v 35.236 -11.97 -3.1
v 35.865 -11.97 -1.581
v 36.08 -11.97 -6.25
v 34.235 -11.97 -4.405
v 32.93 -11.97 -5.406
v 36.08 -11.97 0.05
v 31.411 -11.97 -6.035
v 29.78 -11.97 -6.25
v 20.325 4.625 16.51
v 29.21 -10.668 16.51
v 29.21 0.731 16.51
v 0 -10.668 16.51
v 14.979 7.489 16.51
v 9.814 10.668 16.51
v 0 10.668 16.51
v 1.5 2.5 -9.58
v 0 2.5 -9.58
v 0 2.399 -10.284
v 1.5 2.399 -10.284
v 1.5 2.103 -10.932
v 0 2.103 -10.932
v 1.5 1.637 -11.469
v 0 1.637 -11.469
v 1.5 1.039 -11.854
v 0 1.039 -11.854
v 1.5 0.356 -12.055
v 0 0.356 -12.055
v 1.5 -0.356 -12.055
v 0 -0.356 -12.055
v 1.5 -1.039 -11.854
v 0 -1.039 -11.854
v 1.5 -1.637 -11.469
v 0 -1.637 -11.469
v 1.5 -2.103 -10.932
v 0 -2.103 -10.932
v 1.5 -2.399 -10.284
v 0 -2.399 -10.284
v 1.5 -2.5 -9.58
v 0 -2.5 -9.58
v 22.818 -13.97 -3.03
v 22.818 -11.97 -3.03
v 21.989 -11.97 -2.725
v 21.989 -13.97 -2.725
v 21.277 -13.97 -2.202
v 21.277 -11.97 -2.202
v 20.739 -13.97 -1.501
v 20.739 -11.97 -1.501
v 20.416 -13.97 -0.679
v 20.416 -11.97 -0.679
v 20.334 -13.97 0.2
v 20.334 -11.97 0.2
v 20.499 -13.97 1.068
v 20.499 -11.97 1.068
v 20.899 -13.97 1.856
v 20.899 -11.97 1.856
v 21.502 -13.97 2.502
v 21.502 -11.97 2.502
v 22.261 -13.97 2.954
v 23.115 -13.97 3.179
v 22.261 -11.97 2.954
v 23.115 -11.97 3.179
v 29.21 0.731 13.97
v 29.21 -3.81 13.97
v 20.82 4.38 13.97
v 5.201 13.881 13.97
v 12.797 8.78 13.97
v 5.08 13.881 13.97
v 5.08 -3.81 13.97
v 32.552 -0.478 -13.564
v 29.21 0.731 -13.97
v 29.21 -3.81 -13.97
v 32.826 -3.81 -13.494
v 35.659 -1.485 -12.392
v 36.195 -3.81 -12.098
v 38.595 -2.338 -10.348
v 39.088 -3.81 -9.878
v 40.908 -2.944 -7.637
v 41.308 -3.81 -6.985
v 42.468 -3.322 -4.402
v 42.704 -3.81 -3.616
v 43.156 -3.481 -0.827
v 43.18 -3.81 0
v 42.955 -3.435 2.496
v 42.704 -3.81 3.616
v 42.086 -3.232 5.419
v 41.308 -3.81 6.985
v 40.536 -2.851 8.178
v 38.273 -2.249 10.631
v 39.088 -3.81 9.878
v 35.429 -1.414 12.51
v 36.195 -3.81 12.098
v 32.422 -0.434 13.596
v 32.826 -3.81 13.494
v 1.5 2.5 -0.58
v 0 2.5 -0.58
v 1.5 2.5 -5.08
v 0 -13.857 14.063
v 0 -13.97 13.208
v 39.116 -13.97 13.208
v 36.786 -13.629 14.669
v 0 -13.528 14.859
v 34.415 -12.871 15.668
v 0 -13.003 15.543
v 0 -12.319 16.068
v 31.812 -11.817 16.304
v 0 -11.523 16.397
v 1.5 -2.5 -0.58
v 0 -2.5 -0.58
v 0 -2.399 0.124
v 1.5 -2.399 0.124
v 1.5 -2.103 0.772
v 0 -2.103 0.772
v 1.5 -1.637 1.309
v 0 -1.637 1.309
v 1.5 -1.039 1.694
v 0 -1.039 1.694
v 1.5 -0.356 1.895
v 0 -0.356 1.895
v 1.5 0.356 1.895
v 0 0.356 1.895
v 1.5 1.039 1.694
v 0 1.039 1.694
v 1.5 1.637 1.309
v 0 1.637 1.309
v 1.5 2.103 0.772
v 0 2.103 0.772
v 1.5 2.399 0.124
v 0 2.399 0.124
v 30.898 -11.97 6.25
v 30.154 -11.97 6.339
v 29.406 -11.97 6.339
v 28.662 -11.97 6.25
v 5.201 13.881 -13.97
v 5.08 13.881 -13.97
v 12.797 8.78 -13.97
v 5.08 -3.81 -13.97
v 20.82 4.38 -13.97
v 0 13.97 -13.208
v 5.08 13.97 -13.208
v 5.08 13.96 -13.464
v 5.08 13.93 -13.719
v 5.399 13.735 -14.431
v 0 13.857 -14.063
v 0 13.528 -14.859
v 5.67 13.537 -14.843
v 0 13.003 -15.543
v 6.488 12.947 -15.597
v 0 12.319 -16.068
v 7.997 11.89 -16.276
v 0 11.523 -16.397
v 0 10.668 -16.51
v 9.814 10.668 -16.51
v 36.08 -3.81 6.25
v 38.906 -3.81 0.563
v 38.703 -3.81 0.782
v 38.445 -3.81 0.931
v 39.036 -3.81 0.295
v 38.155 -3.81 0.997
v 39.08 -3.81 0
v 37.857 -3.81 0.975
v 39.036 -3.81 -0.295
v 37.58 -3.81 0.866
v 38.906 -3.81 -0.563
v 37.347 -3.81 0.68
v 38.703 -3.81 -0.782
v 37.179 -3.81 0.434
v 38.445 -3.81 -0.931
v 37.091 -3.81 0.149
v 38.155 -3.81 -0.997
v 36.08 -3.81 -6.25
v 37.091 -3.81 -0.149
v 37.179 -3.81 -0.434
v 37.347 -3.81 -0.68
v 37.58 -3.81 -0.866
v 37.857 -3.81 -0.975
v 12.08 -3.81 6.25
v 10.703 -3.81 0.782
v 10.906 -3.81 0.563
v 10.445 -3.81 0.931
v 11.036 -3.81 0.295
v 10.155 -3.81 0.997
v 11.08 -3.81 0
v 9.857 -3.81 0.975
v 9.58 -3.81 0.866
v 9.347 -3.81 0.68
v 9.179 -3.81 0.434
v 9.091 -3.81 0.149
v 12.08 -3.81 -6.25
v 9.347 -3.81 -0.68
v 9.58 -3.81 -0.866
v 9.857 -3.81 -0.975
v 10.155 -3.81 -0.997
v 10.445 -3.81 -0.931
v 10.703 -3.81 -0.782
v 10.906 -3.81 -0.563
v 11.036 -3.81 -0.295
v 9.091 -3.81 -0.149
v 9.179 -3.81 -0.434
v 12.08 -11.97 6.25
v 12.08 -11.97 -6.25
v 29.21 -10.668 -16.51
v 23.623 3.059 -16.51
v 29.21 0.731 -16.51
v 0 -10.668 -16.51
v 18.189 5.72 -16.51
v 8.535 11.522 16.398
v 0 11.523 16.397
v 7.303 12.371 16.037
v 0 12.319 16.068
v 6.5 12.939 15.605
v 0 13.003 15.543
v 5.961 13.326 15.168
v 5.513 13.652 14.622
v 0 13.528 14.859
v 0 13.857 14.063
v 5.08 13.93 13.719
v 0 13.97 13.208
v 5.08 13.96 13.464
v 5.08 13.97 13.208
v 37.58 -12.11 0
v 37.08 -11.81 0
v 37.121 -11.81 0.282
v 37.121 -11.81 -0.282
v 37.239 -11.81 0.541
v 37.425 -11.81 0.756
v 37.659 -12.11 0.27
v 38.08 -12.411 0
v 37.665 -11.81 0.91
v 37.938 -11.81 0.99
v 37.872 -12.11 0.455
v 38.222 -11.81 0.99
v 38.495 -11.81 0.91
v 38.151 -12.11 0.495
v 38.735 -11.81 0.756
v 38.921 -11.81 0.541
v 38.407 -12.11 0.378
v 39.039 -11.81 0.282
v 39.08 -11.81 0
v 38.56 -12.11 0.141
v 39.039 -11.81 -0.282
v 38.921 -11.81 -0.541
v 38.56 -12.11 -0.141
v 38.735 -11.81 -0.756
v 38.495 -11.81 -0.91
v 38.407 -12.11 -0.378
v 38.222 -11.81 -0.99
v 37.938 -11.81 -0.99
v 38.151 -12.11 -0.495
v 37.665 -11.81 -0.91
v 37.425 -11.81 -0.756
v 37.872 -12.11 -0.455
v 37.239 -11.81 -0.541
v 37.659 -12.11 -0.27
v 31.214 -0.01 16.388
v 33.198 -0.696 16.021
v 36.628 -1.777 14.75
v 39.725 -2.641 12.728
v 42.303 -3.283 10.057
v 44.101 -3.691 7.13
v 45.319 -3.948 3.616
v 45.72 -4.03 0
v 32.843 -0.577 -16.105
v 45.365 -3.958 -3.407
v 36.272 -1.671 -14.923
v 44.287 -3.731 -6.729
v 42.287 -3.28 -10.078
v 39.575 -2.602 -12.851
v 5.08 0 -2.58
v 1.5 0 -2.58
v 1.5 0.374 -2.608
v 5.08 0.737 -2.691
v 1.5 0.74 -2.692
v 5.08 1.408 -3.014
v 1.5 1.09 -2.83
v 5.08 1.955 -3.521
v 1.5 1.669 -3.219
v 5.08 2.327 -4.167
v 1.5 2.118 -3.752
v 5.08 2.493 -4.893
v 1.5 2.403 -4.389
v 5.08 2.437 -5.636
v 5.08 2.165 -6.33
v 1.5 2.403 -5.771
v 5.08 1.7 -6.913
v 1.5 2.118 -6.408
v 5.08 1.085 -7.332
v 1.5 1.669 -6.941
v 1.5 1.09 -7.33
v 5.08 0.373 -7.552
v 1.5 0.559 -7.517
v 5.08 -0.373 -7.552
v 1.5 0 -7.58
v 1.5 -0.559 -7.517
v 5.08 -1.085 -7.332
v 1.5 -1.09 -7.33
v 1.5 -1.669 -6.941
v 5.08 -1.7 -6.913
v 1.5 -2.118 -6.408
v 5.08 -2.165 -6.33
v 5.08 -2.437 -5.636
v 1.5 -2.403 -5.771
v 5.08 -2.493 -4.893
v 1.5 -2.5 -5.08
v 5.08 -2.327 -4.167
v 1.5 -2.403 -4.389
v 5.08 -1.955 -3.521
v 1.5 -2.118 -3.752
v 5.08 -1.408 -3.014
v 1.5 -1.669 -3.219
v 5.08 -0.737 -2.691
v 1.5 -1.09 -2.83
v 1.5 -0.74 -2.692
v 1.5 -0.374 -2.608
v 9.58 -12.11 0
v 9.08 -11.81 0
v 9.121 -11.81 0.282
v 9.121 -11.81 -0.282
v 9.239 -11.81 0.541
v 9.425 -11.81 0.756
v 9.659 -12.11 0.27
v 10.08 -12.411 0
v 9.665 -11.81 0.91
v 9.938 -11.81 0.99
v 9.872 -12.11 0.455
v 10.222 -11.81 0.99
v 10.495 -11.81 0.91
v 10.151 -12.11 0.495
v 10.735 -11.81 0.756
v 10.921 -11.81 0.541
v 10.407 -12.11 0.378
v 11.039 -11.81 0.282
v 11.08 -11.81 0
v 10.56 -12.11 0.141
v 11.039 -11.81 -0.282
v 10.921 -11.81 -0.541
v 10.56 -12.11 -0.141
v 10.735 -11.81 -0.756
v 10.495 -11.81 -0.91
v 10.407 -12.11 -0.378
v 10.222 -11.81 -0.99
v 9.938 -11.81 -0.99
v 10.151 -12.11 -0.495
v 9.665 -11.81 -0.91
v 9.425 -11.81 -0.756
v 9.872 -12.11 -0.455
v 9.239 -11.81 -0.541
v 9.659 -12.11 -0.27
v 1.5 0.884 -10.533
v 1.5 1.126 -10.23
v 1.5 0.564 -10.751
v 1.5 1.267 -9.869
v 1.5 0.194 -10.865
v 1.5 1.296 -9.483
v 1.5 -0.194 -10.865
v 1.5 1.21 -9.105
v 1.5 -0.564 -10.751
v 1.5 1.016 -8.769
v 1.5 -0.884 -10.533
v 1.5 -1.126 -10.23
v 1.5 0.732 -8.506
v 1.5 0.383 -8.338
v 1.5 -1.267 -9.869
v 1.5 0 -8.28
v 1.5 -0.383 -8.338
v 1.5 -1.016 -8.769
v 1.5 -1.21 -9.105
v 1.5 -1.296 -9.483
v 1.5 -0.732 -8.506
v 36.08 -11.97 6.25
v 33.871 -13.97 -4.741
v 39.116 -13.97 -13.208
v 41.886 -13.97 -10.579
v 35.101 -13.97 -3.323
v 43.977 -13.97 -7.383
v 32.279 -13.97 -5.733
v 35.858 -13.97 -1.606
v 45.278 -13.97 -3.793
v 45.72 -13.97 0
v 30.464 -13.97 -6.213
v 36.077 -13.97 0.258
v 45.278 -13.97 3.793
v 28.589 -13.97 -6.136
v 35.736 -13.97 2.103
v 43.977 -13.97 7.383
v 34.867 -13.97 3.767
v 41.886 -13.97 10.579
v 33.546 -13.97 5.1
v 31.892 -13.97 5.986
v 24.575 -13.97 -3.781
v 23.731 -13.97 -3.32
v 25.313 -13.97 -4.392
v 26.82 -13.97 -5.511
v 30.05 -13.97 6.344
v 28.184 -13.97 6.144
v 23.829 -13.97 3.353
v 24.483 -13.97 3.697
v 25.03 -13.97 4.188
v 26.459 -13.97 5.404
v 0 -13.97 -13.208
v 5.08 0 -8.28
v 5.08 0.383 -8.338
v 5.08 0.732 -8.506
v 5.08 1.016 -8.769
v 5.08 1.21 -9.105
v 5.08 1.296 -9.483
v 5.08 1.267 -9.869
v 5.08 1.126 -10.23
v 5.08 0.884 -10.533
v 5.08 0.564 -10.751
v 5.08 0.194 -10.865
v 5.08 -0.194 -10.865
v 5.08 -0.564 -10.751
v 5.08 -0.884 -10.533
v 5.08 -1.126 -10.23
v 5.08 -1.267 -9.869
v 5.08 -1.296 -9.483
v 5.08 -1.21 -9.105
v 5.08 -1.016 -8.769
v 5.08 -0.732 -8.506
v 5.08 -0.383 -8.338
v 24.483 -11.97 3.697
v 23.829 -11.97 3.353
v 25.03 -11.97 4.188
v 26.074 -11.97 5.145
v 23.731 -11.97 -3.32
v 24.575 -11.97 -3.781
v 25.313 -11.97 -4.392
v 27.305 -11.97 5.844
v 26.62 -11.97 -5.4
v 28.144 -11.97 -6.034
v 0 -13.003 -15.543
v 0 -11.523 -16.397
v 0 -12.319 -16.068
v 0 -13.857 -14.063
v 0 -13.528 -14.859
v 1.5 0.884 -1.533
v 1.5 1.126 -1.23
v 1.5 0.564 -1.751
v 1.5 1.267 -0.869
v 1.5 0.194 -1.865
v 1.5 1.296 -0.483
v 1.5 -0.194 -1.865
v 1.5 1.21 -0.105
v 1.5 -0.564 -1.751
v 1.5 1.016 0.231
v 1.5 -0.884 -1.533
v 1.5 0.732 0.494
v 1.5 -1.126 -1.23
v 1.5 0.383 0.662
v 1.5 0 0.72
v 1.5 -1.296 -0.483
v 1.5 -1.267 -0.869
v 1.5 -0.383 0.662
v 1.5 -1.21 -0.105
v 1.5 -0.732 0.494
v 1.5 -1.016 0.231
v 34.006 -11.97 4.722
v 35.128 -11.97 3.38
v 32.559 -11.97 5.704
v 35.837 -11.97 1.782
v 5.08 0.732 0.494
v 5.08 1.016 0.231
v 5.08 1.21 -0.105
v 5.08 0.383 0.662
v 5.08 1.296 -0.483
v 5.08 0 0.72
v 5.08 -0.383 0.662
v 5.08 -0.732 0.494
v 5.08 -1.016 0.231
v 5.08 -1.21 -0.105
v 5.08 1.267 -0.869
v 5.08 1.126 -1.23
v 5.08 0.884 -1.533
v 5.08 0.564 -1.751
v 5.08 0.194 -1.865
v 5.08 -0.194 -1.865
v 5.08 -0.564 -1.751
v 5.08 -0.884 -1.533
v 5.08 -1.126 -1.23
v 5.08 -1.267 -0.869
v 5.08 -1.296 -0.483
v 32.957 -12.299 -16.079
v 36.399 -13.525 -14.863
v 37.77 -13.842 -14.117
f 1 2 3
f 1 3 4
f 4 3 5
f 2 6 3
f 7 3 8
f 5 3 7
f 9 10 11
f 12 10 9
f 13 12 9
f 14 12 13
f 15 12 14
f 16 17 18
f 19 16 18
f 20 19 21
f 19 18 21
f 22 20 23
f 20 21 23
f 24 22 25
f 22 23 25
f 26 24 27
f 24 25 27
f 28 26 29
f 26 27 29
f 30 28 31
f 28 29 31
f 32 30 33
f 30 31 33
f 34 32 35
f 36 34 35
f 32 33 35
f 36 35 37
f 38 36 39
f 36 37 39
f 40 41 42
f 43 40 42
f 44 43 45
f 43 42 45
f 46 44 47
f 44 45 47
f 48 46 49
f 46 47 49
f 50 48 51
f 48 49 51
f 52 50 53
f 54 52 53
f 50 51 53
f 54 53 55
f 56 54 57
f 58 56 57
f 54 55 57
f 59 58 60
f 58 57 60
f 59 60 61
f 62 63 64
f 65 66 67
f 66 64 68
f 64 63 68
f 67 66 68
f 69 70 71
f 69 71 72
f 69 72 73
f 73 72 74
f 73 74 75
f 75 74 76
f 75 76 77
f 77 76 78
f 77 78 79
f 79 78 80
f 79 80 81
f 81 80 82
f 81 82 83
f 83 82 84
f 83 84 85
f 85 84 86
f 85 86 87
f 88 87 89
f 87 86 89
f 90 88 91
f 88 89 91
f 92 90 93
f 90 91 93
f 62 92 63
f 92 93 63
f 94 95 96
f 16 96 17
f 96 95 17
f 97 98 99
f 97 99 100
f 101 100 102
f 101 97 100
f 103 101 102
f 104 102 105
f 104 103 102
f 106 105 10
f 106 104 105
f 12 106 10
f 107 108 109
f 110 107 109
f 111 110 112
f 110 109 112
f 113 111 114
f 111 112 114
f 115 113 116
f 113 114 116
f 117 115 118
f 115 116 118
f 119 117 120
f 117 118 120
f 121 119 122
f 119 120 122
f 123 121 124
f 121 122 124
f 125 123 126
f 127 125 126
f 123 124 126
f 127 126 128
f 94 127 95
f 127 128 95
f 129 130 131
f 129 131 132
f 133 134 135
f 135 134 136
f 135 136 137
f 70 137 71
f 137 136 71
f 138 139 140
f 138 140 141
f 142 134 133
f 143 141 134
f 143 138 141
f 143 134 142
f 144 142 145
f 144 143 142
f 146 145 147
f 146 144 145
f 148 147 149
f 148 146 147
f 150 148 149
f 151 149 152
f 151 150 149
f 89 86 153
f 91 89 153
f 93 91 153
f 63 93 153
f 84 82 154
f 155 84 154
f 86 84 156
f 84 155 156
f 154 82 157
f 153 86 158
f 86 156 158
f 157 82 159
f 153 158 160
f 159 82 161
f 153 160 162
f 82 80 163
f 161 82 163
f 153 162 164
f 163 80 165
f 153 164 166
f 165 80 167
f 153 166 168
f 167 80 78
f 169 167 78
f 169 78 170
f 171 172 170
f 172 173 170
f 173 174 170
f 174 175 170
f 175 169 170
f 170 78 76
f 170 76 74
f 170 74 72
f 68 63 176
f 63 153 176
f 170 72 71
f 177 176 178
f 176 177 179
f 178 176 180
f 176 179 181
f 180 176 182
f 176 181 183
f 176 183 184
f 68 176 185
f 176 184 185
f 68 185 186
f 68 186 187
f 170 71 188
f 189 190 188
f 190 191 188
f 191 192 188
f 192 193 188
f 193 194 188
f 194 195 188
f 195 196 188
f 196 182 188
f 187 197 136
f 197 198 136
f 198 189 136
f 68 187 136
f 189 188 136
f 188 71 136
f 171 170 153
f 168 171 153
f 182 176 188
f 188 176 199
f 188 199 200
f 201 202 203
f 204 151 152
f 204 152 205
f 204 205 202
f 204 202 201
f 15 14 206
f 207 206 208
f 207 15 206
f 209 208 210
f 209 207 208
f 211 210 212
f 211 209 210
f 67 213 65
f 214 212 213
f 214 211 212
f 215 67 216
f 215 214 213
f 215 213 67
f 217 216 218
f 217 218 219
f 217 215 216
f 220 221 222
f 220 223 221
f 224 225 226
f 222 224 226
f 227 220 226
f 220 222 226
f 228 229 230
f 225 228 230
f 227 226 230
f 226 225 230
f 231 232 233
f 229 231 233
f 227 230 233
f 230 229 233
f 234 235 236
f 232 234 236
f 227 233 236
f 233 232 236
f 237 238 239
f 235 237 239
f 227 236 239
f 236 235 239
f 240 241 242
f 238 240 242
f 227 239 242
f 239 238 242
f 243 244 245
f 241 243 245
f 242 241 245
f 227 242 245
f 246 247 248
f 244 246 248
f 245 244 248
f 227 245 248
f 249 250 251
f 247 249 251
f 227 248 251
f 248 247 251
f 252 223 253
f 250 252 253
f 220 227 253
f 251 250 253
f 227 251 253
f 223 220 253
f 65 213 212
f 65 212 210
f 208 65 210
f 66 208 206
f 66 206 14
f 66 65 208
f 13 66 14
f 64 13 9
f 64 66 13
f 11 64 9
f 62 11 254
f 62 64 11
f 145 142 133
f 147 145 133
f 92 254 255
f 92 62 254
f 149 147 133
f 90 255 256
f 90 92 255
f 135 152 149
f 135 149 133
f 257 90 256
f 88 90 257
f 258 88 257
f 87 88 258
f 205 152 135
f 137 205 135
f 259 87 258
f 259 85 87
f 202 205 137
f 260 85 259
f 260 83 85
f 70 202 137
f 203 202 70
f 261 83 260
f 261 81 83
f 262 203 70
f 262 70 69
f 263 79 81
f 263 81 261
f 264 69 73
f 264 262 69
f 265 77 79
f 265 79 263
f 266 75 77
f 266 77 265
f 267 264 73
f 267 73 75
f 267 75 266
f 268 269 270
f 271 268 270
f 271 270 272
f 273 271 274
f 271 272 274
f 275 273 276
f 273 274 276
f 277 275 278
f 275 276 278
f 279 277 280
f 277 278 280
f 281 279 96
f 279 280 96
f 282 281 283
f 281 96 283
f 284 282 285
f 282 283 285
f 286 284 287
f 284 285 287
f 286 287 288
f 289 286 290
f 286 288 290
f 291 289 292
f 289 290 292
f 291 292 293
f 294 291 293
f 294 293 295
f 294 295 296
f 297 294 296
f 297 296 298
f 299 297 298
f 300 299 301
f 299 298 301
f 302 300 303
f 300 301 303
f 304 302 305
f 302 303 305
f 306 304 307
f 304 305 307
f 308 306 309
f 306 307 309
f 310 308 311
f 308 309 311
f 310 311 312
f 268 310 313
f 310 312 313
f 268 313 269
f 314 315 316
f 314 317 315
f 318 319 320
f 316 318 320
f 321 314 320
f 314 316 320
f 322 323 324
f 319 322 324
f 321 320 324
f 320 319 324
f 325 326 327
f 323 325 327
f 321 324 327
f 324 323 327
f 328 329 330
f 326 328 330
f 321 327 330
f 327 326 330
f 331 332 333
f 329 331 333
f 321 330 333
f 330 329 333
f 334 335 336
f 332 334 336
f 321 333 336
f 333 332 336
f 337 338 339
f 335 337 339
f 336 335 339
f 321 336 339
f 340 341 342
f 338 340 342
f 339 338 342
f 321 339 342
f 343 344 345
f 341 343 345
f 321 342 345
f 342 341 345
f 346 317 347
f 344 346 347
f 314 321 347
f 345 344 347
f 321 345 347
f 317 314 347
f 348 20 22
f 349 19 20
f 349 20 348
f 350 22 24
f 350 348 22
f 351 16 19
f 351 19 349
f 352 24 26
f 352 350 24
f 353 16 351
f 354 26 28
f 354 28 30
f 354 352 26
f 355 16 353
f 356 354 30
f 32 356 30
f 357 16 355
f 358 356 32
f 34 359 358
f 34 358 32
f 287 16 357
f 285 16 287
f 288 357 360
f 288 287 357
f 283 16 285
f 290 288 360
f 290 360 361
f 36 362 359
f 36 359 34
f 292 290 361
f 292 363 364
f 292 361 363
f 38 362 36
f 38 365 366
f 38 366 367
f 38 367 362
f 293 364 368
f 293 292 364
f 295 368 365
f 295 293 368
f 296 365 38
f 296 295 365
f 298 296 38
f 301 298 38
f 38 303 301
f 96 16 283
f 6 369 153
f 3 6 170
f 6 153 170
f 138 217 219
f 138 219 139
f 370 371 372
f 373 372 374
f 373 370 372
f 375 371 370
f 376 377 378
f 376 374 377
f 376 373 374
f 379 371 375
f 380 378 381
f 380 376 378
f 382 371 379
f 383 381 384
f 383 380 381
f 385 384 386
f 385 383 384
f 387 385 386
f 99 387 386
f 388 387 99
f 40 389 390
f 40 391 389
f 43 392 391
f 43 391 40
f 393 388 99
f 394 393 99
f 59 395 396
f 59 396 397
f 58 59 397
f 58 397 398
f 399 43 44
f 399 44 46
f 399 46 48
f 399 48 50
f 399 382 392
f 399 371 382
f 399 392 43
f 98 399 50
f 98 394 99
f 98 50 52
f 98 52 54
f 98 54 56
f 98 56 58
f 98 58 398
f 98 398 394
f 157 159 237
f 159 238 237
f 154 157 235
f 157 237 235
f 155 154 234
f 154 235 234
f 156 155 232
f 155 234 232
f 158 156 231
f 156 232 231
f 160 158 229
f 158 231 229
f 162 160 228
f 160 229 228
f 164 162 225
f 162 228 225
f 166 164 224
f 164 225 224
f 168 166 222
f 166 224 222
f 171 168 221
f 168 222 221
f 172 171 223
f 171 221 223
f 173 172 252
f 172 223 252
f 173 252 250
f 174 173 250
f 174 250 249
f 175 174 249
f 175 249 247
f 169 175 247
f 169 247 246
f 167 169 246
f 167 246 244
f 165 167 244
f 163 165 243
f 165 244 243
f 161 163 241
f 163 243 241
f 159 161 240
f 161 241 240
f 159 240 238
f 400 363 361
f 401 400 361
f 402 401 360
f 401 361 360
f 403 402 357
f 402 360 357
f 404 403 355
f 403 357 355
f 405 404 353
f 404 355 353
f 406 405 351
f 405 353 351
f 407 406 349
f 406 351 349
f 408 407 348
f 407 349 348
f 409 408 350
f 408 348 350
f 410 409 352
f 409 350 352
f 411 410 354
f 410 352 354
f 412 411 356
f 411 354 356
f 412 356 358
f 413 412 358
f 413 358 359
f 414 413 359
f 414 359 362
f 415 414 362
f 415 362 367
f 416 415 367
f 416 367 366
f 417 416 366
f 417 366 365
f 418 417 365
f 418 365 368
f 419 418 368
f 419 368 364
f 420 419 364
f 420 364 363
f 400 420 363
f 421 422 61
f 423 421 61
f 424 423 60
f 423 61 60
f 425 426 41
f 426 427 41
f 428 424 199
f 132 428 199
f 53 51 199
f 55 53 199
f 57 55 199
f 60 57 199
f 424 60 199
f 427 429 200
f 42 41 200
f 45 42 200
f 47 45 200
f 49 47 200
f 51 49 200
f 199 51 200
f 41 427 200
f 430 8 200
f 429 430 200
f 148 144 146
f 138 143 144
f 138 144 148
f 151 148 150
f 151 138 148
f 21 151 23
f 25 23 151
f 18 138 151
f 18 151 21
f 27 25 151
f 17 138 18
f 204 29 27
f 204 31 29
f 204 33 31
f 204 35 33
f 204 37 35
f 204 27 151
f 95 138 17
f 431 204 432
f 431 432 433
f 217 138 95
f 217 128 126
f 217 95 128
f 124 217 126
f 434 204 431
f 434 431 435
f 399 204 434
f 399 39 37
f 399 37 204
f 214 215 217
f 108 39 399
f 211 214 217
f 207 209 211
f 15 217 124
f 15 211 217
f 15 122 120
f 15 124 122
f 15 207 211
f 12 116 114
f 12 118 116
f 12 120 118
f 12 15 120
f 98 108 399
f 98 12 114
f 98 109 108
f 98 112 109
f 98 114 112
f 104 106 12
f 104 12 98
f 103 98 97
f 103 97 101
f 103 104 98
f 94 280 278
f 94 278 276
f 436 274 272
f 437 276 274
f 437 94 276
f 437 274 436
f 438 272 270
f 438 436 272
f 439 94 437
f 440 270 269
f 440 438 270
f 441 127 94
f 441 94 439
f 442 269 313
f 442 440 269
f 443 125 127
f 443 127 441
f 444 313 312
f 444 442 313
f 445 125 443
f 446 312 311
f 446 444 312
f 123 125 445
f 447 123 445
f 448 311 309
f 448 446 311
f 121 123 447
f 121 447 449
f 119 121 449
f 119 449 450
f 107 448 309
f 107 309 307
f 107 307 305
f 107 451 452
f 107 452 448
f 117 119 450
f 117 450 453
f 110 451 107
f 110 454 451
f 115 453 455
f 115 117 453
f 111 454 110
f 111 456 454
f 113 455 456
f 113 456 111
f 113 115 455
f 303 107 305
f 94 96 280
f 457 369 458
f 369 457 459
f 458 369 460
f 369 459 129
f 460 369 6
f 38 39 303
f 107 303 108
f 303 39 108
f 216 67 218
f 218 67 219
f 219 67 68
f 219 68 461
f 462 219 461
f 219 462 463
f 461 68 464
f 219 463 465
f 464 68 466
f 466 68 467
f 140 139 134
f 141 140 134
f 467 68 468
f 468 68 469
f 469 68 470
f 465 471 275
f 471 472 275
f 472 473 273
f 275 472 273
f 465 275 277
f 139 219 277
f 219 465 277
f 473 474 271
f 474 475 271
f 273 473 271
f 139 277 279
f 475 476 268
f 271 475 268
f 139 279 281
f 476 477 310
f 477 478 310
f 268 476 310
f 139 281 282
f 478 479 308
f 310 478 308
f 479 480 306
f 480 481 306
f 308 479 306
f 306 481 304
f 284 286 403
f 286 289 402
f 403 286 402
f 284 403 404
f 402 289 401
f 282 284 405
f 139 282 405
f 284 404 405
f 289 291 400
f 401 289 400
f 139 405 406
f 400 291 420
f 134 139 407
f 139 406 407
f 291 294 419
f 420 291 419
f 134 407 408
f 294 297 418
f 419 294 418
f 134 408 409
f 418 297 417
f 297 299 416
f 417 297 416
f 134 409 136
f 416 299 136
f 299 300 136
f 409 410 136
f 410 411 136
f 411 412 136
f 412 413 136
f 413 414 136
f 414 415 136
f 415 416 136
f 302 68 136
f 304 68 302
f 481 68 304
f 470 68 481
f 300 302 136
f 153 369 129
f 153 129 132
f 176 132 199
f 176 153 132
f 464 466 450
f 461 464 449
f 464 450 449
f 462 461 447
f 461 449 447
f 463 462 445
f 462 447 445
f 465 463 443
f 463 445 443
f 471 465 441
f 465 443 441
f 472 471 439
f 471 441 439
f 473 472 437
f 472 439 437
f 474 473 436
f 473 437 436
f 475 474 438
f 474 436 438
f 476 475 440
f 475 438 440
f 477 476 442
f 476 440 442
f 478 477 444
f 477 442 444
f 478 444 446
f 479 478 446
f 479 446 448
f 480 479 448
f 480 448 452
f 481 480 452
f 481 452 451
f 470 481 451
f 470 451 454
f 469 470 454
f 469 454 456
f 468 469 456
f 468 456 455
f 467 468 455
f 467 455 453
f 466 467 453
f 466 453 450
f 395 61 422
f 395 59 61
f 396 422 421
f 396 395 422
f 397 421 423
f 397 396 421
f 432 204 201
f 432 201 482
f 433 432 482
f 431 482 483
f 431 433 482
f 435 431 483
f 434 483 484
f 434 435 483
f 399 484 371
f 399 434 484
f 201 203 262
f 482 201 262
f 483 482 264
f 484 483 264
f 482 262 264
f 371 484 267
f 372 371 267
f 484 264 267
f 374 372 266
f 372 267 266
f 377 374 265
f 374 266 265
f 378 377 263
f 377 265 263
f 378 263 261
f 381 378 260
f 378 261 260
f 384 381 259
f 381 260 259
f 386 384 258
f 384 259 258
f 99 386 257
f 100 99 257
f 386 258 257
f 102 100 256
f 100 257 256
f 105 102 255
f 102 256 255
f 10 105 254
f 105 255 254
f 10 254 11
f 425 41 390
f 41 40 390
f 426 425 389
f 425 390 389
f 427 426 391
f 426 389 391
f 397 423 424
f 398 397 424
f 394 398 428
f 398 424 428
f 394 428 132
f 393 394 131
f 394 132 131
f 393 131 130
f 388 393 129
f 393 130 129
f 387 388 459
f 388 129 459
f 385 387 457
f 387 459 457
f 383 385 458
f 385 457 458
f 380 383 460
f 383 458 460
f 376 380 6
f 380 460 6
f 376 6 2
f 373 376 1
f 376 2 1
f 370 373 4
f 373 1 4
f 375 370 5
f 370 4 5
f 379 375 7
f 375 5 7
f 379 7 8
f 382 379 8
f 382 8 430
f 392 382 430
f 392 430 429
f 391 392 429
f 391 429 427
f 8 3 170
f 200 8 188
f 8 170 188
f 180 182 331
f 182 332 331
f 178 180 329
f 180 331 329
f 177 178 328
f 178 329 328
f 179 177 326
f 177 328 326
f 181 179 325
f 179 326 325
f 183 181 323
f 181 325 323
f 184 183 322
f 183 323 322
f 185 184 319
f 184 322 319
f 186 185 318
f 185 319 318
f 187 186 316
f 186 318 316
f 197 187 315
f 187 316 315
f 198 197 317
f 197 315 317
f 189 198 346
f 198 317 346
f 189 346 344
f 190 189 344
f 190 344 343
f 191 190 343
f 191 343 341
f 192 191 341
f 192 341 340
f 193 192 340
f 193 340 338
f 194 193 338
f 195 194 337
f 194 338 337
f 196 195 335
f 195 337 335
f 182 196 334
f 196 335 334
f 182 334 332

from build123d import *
from OCP.BRepFilletAPI import BRepFilletAPI_MakeFillet

# Parameters (mm, degrees)
BOSS_EXTRUDE1_DEPTH       = 45.72
CUT_EXTRUDE1_DEPTH        = 59.101632507
FILLET2_R                 = 16.51
FILLET3_R                 = 16.51
SKETCH3_OUTSIDE_W         = 60.308
SKETCH3_OUTSIDE_H         = 47.608
CUT_EXTRUDE2_DEPTH        = 52.759317573
SKETCH5_W                 = 24.000000006
SKETCH5_H                 = 12.5
CUT_EXTRUDE3_DEPTH        = 8.16
CUT_EXTRUDE4_DEPTH        = 56.097932423
FILLET4_R1                = 3
FILLET4_R2                = 5
F_2_0MM_DOWEL_HOLE1_D     = 2
F_2_0MM_DOWEL_HOLE1_DEPTH = 8
F_2_0MM_DOWEL_HOLE1_TIP   = 0.600860619
SKETCH11_R                = 2.5
SKETCH11_R_2              = 1.3
CUT_EXTRUDE6_DEPTH        = 5.08
CUT_EXTRUDE7_DEPTH        = 1.5


with BuildPart() as part:
    # Sketch1 → Boss-Extrude1 (new body)
    with BuildSketch(Plane.YZ):
        with BuildLine():
            Line((10.668, -16.51), (-10.668, -16.51))
            ThreePointArc((-10.668, -16.51), (-13.002866591, -15.542866591), (-13.97, -13.208))
            Line((-13.97, -13.208), (-13.97, 13.208))
            ThreePointArc((-13.97, 13.208), (-13.002866591, 15.542866591), (-10.668, 16.51))
            Line((-10.668, 16.51), (10.668, 16.51))
            ThreePointArc((10.668, 16.51), (13.002866591, 15.542866591), (13.97, 13.208))
            Line((13.97, 13.208), (13.97, -13.208))
            ThreePointArc((13.97, -13.208), (13.002866591, -15.542866591), (10.668, -16.51))
        make_face()
    extrude(amount=BOSS_EXTRUDE1_DEPTH)

    # Sketch2 → Cut-Extrude1 (cut, through all)
    with BuildSketch(Plane(origin=(0, 0, -16.51), x_dir=(1, 0, 0), z_dir=(0, 0, -1))):
        with BuildLine():
            Line((5.08, -13.97), (45.72, -13.97))
            Line((45.72, -13.97), (45.72, 4.03))
            add(Edge.make_bspline(
                [(5.08, -13.97), (23.327246471, -0.48405524), (45.72, 4.03)],
                knots=[0, 0, 0, 1, 1, 1], degree=2))
        make_face()
    extrude(amount=-CUT_EXTRUDE1_DEPTH, mode=Mode.SUBTRACT)

    # Fillet2
    # the kernel refuses this fillet: 16.51 mm, written as the material it takes off along each edge
    with BuildSketch(Plane(origin=(45.72, 37.245, -16.51), x_dir=(-1, 0, 0), z_dir=(0, -1, 0))) as fillet2_piece_1:
        with BuildLine():
            CenterArc((FILLET2_R, -FILLET2_R), FILLET2_R, 90, 90)
            Line((0, -FILLET2_R), (0, 0))
            Line((0, 0), (FILLET2_R, 0))
        make_face()
    extrude(amount=89.188, mode=Mode.SUBTRACT)

    # Fillet3
    # the kernel refuses this fillet: 16.51 mm, written as the material it takes off along each edge
    with BuildSketch(Plane(origin=(45.72, -51.943, 16.51), x_dir=(-1, 0, 0), z_dir=(0, 1, 0))) as fillet3_piece_1:
        with BuildLine():
            CenterArc((FILLET3_R, -FILLET3_R), FILLET3_R, 90, 90)
            Line((0, -FILLET3_R), (0, 0))
            Line((0, 0), (FILLET3_R, 0))
        make_face()
    extrude(amount=89.188, mode=Mode.SUBTRACT)

    # Sketch3 outside → Cut-Extrude2 (cut, through all)
    # profile 1 of 2: a face of its own
    with BuildSketch(Plane(origin=(0, -3.81, 0), x_dir=(-1, 0, 0), z_dir=(0, -1, 0))):
        with Locations((-22.86, 0)):
            Rectangle(SKETCH3_OUTSIDE_W, SKETCH3_OUTSIDE_H)
        with BuildLine():
            Line((-29.21, -16.51), (0, -16.51))
            Line((0, -16.51), (0, 16.51))
            Line((0, 16.51), (-29.21, 16.51))
            ThreePointArc((-29.21, 16.51), (-45.72, 0), (-29.21, -16.51))
        make_face(mode=Mode.SUBTRACT)
    # profile 2 of 2: a face of its own
    with BuildSketch(Plane(origin=(0, -3.81, 0), x_dir=(-1, 0, 0), z_dir=(0, -1, 0))):
        with BuildLine():
            Line((-29.21, -13.97), (-5.08, -13.97))
            Line((-5.08, -13.97), (-5.08, 13.97))
            Line((-5.08, 13.97), (-29.21, 13.97))
            ThreePointArc((-29.21, 13.97), (-43.18, 0), (-29.21, -13.97))
        make_face()
    extrude(amount=-CUT_EXTRUDE2_DEPTH, mode=Mode.SUBTRACT)

    # Sketch5 → Cut-Extrude3 (cut)
    with BuildSketch(Plane(origin=(0, -3.81, 0), x_dir=(-1, 0, 0), z_dir=(0, -1, 0))):
        with Locations((-24.080000003, 0)):
            Rectangle(SKETCH5_W, SKETCH5_H)
    extrude(amount=CUT_EXTRUDE3_DEPTH, mode=Mode.SUBTRACT)

    # Sketch6 → Cut-Extrude4 (cut, through all)
    with BuildSketch(Plane(origin=(0, -11.97, 0), x_dir=(-1, 0, 0), z_dir=(0, 1, 0))):
        with BuildLine():
            ThreePointArc((-24.267500006, 3.099974385), (-36.080000006, 0.05), (-24.267500006, -2.999974385))
            ThreePointArc((-24.267500006, -2.999974385), (-20.330000006, 0.05), (-24.267500006, 3.099974385))
        make_face()
    extrude(amount=-CUT_EXTRUDE4_DEPTH, mode=Mode.SUBTRACT)

    # Fillet4: one fillet with a radius per group of edges: ONE call of the kernel's fillet builder (fillet() takes one radius for all edges)
    fillet4_edges_1 = [part.edges().sort_by_distance(p)[0] for p in [
        (24.267500006, -12.97, 3.099974385),
    ]]
    fillet4_edges_2 = [part.edges().sort_by_distance(p)[0] for p in [
        (24.267500006, -12.97, -2.999974385),
    ]]
    fillet4 = BRepFilletAPI_MakeFillet(part.part.solid().wrapped)
    for e in fillet4_edges_1:
        fillet4.Add(FILLET4_R1, e.wrapped)
    for e in fillet4_edges_2:
        fillet4.Add(FILLET4_R2, e.wrapped)
    add(Compound.cast(fillet4.Shape()), mode=Mode.REPLACE)

    # Ø2.0mm Dowel Hole1
    with Locations(Plane(origin=(0, -3.81, 0), x_dir=(-1, 0, 0), z_dir=(0, 1, 0))):
        with Locations((-10.08, 0), (-38.080000006, 0)):
            Hole(F_2_0MM_DOWEL_HOLE1_D / 2, depth=F_2_0MM_DOWEL_HOLE1_DEPTH)
            with Locations((0, 0, -(F_2_0MM_DOWEL_HOLE1_DEPTH + F_2_0MM_DOWEL_HOLE1_TIP / 2))):  # 118° drill point
                Cone(0, F_2_0MM_DOWEL_HOLE1_D / 2, F_2_0MM_DOWEL_HOLE1_TIP, mode=Mode.SUBTRACT)

    # Sketch11 → Cut-Extrude6 (cut)
    with BuildSketch(Plane(origin=(0, 0, 0), x_dir=(0, -1, 0), z_dir=(-1, 0, 0))):
        with Locations(Location((0, -5.08, 0), (0, 0, 90))):
            Circle(SKETCH11_R)
        with Locations(Location((0, -0.58, 0), (0, 0, 90))):
            Circle(SKETCH11_R_2)
        with Locations(Location((0, -9.58, 0), (0, 0, 90))):
            Circle(SKETCH11_R_2)
    extrude(amount=-CUT_EXTRUDE6_DEPTH, mode=Mode.SUBTRACT)

    # Sketch12 → Cut-Extrude7 (cut)
    with BuildSketch(Plane(origin=(0, 0, 0), x_dir=(0, -1, 0), z_dir=(-1, 0, 0))):
        with BuildLine():
            Line((1.3, -9.58), (2.5, -9.58))
            ThreePointArc((2.5, -9.58), (2.118290802, -8.252278614), (1.089724736, -7.33))
            ThreePointArc((1.089724736, -7.33), (0, -7.58), (-1.089724736, -7.33))
            ThreePointArc((-1.089724736, -7.33), (-2.118290802, -8.252278614), (-2.5, -9.58))
            Line((-2.5, -9.58), (-1.3, -9.58))
            ThreePointArc((-1.3, -9.58), (0, -8.28), (1.3, -9.58))
        make_face()
        with BuildLine():
            Line((2.5, -5.08), (2.5, -0.58))
            ThreePointArc((2.5, -0.58), (2.118290802, -1.907721386), (1.089724736, -2.83))
            ThreePointArc((1.089724736, -2.83), (2.118290802, -3.752278614), (2.5, -5.08))
        make_face()
        with BuildLine():
            Line((2.5, -9.58), (2.5, -5.08))
            ThreePointArc((2.5, -5.08), (2.118290802, -6.407721386), (1.089724736, -7.33))
            ThreePointArc((1.089724736, -7.33), (2.118290802, -8.252278614), (2.5, -9.58))
        make_face()
        with BuildLine():
            ThreePointArc((-1.089724736, -7.33), (-2.118290802, -6.407721386), (-2.5, -5.08))
            Line((-2.5, -5.08), (-2.5, -9.58))
            ThreePointArc((-2.5, -9.58), (-2.118290802, -8.252278614), (-1.089724736, -7.33))
        make_face()
        with BuildLine():
            ThreePointArc((-1.089724736, -2.83), (-2.118290802, -1.907721386), (-2.5, -0.58))
            Line((-2.5, -0.58), (-2.5, -5.08))
            ThreePointArc((-2.5, -5.08), (-2.118290802, -3.752278614), (-1.089724736, -2.83))
        make_face()
        with BuildLine():
            ThreePointArc((1.089724736, -2.83), (2.118290802, -1.907721386), (2.5, -0.58))
            Line((2.5, -0.58), (1.3, -0.58))
            ThreePointArc((1.3, -0.58), (0, -1.88), (-1.3, -0.58))
            Line((-1.3, -0.58), (-2.5, -0.58))
            ThreePointArc((-2.5, -0.58), (-2.118290802, -1.907721386), (-1.089724736, -2.83))
            ThreePointArc((-1.089724736, -2.83), (0, -2.58), (1.089724736, -2.83))
        make_face()
        with BuildLine():
            Line((1.3, -0.58), (2.5, -0.58))
            ThreePointArc((2.5, -0.58), (0, 1.92), (-2.5, -0.58))
            Line((-2.5, -0.58), (-1.3, -0.58))
            ThreePointArc((-1.3, -0.58), (0, 0.72), (1.3, -0.58))
        make_face()
        with BuildLine():
            ThreePointArc((-2.5, -9.58), (0, -12.08), (2.5, -9.58))
            Line((2.5, -9.58), (1.3, -9.58))
            ThreePointArc((1.3, -9.58), (0, -10.88), (-1.3, -9.58))
            Line((-1.3, -9.58), (-2.5, -9.58))
        make_face()
    extrude(amount=-CUT_EXTRUDE7_DEPTH, mode=Mode.SUBTRACT)


solid = part.part
